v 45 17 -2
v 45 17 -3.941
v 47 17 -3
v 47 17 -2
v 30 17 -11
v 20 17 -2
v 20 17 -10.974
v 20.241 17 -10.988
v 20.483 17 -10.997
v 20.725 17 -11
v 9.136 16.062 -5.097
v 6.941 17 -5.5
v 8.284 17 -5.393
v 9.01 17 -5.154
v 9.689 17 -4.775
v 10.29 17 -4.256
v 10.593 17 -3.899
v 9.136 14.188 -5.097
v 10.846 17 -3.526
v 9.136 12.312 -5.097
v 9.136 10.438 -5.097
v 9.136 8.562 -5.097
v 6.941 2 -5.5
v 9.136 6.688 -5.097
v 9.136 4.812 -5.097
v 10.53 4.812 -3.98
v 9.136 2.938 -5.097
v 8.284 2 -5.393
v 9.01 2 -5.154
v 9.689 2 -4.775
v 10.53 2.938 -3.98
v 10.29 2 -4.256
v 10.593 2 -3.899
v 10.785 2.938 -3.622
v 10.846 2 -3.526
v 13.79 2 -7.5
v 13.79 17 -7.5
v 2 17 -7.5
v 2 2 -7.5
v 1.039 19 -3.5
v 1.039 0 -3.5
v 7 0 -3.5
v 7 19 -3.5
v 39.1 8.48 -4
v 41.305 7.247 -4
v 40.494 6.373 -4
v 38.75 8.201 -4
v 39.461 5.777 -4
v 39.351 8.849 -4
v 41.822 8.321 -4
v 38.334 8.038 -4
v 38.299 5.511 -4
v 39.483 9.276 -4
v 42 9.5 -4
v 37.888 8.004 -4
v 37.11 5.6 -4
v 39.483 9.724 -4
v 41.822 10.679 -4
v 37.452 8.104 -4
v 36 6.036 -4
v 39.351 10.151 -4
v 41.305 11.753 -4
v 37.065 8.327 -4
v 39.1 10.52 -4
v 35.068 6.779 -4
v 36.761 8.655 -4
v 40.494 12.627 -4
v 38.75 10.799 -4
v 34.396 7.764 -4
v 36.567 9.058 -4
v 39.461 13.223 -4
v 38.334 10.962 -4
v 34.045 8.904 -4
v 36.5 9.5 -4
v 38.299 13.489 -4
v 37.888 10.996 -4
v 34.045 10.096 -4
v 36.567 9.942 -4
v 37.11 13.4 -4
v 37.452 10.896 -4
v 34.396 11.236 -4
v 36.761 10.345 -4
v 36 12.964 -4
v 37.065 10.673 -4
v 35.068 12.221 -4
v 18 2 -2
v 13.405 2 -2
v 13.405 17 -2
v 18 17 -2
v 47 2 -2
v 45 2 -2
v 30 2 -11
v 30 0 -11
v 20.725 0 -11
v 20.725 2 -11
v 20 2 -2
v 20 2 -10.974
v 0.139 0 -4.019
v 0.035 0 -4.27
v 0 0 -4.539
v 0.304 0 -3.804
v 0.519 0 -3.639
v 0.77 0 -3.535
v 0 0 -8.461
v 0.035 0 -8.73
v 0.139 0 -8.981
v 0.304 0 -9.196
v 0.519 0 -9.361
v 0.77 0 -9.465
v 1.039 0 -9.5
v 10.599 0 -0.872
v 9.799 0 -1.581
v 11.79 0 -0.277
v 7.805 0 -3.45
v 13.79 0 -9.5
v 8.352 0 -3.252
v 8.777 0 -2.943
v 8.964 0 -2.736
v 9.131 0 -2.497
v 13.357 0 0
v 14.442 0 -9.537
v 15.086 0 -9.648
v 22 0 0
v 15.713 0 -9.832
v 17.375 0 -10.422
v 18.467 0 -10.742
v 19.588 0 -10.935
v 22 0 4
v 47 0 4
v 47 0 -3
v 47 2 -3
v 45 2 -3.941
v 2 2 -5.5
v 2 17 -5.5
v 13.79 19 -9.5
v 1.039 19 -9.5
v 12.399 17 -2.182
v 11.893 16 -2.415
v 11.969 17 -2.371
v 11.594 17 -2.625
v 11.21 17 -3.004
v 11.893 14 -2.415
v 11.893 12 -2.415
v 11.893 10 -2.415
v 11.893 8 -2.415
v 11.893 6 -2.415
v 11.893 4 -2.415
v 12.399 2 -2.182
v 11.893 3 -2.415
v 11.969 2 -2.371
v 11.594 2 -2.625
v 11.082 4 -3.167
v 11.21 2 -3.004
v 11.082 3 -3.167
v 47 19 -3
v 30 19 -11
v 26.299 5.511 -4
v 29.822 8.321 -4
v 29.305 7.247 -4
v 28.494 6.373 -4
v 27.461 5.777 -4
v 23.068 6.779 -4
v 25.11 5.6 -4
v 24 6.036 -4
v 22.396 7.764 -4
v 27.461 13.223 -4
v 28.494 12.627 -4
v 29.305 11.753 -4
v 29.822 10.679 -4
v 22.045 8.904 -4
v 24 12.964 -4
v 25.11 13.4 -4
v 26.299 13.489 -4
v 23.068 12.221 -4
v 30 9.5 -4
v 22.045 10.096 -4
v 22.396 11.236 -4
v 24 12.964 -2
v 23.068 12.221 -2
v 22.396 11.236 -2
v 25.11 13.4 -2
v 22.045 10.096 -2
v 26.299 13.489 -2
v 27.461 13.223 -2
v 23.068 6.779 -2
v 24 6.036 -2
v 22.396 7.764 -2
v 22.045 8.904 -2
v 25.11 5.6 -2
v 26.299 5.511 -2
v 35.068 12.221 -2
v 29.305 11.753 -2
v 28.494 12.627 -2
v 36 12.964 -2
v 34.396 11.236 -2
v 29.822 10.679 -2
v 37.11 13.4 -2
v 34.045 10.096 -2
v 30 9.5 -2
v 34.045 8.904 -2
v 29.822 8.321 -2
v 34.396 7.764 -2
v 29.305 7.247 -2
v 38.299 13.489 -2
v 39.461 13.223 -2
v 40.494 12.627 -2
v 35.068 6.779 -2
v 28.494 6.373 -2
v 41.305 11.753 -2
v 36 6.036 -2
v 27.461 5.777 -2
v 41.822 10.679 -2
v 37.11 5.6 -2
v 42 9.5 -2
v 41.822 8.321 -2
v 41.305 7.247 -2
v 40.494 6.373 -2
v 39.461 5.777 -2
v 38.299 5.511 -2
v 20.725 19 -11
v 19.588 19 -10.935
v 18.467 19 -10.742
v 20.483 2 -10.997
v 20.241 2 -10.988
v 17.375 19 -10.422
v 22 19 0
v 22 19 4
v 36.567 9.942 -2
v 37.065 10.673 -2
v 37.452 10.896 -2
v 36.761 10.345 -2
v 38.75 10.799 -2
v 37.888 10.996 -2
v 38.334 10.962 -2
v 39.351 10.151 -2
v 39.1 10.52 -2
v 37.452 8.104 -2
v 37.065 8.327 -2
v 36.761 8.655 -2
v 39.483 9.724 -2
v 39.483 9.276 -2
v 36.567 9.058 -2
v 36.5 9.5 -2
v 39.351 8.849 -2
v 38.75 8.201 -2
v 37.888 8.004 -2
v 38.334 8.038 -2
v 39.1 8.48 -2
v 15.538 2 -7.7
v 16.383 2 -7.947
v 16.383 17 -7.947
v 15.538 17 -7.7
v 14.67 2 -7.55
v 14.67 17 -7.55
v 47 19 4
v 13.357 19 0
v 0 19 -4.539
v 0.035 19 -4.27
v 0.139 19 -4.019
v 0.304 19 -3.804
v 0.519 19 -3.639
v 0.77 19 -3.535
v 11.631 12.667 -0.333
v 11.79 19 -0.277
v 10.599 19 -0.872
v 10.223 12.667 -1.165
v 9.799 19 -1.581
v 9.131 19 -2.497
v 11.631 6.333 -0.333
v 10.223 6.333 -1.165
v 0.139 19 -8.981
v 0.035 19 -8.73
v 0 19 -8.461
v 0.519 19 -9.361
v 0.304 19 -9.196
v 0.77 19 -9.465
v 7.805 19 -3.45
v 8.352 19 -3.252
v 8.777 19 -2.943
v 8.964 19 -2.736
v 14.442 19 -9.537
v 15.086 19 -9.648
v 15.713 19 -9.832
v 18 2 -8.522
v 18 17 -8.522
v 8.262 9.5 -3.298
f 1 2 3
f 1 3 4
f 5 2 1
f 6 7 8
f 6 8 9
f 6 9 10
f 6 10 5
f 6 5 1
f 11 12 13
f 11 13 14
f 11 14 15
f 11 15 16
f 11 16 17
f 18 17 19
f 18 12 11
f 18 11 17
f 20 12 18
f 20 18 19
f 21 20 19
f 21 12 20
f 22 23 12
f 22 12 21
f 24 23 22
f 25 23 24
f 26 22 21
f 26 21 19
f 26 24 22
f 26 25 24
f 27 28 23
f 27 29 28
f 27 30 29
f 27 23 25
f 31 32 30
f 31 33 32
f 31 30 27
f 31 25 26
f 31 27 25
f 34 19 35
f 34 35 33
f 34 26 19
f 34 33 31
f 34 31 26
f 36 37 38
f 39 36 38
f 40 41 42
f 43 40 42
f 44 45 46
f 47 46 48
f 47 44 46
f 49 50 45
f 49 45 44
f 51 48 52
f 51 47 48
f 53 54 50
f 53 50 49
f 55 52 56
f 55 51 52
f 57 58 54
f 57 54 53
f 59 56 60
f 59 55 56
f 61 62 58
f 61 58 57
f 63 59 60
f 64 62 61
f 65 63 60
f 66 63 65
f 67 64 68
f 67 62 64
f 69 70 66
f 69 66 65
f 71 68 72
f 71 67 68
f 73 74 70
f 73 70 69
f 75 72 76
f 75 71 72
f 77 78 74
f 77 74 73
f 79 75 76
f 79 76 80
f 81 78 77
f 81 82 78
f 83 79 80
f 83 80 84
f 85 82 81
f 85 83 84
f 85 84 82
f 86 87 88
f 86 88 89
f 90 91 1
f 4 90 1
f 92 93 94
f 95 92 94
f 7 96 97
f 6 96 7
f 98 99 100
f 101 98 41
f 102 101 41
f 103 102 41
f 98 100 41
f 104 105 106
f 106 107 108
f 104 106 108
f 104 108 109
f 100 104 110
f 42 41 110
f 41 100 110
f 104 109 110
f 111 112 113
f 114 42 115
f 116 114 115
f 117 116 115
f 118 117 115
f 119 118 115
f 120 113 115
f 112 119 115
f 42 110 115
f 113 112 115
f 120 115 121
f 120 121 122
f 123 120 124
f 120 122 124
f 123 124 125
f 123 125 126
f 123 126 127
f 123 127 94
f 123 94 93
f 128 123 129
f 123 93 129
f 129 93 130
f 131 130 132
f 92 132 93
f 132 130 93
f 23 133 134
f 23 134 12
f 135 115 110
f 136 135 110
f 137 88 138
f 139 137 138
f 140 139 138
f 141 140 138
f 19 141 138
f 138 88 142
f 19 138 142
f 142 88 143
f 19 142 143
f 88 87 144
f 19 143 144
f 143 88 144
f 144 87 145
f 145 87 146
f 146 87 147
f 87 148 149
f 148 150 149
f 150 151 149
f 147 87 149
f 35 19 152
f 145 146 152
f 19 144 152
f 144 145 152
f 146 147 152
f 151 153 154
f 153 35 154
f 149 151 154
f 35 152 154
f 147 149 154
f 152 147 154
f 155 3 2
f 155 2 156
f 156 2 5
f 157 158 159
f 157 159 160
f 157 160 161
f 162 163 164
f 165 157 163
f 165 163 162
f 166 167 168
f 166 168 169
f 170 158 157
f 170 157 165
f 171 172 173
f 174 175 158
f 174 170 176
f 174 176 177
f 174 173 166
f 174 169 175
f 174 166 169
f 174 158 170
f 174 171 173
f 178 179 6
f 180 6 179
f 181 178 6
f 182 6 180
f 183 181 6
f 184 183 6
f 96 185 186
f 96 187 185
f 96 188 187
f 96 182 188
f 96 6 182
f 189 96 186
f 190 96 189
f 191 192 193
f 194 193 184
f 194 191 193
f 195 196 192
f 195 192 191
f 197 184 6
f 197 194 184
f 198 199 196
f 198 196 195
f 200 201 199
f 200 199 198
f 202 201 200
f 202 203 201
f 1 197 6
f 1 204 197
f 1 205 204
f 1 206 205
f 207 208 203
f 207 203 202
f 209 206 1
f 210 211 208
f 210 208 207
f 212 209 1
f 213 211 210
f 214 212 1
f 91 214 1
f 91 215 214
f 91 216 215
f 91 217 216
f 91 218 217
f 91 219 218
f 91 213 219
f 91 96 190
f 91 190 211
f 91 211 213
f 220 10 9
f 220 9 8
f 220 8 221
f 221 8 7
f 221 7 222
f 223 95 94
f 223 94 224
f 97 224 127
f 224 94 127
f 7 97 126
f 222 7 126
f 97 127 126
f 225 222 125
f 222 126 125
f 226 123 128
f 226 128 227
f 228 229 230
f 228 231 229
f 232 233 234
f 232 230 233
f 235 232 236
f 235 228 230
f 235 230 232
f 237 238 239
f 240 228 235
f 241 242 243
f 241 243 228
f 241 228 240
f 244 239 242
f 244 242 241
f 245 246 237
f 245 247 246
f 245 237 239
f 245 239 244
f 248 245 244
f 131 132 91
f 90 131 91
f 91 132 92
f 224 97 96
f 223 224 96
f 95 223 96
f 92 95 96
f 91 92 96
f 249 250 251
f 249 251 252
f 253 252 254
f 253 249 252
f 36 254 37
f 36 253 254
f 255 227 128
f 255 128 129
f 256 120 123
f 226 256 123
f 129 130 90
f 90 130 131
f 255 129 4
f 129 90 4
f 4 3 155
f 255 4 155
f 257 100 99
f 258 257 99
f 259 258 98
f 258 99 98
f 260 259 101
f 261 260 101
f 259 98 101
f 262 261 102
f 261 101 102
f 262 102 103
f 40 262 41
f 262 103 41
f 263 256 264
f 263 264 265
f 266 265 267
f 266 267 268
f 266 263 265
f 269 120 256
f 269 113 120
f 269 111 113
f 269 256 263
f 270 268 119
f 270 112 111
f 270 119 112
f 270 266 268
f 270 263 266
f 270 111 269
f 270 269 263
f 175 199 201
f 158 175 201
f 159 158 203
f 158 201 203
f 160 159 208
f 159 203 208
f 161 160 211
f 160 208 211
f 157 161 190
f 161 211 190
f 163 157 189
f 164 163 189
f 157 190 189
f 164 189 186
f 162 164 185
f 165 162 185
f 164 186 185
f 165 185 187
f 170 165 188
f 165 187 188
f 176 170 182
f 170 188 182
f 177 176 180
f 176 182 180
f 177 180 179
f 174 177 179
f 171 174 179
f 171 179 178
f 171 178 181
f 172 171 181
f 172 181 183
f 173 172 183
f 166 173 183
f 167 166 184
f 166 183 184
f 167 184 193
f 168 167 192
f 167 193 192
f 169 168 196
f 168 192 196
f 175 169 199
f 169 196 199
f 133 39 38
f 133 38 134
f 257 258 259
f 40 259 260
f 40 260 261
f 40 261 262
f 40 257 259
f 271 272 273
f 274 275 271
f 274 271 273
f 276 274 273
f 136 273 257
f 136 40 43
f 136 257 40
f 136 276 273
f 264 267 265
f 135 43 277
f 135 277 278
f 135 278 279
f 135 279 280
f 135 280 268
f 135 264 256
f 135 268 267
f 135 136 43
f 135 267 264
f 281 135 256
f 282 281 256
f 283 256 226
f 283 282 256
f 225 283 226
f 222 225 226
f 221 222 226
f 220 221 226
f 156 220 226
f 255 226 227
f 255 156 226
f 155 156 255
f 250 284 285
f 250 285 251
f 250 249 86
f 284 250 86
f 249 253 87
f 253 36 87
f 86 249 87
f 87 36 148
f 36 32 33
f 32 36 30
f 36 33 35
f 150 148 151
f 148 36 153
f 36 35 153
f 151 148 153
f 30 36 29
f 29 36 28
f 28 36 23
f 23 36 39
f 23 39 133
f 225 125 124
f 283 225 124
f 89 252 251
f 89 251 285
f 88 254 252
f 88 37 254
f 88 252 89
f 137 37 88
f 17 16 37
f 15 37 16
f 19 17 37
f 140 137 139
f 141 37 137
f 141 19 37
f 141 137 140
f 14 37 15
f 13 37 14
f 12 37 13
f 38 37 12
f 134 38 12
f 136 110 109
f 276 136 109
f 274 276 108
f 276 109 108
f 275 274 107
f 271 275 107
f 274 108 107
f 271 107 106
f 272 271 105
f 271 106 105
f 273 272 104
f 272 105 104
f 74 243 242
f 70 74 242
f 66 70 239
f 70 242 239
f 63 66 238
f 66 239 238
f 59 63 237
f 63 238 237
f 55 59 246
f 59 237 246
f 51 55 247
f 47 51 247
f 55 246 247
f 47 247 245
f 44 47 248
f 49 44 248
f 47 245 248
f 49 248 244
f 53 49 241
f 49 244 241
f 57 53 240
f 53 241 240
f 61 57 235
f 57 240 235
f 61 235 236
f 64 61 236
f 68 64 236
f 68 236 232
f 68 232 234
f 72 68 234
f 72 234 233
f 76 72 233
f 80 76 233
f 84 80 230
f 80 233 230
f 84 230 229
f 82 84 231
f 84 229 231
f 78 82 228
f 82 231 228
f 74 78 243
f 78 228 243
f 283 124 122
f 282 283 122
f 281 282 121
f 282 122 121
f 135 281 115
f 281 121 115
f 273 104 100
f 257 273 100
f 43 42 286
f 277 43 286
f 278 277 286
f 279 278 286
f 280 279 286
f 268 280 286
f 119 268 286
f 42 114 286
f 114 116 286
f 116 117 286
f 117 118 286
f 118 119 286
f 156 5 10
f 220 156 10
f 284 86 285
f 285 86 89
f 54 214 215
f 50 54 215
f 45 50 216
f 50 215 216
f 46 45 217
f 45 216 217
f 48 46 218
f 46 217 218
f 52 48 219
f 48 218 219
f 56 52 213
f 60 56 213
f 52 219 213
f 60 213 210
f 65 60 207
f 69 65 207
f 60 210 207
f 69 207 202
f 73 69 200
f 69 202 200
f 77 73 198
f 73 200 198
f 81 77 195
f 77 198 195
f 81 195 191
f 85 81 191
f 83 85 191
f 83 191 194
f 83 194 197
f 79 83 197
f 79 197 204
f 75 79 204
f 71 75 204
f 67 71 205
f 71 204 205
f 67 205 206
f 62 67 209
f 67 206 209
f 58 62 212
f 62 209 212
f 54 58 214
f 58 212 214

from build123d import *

# Parameters (mm, degrees)
BOSS_EXTRUDE1_DEPTH = 19
SHELL1_START        = 2
SHELL1_DEPTH        = 15
SKETCH3_W           = 1.941176471
SKETCH3_H           = 15
CUT_EXTRUDE1_DEPTH  = 19
SKETCH4_W           = 27
SKETCH4_H           = 15
CUT_EXTRUDE2_DEPTH  = 32
BOSS_EXTRUDE2_REACH = 53.488
SKETCH5_W           = 2
SKETCH5_H           = 15
BOSS_EXTRUDE3_DEPTH = 2
SKETCH9_W           = 25
SKETCH9_H           = 19
BOSS_EXTRUDE4_DEPTH = 4


# Read off the part's stored shape, not the designer's step: Shell1
with BuildPart() as part:
    # Sketch1 → Boss-Extrude1 (new body)
    with BuildSketch(Plane(origin=(0, 0, 0), x_dir=(1, 0, 0), z_dir=(0, 1, 0))):
        with BuildLine():
            Line((1.038993018, 3.5), (7, 3.5))
            add(Edge.make_bspline(
                [(7, 3.5), (8.459278233, 3.59711175), (9.130651495, 2.496759959)],
                knots=[0, 0, 0, 1, 1, 1], degree=2))
            add(Edge.make_bspline(
                [(13.357309771, 0), (11.472981218, 0.082883183), (10.064095126, 0.915136502), (9.130651495, 2.496759959)],
                knots=[0.099588888, 0.099588888, 0.099588888, 0.099588888, 1, 1, 1, 1], degree=3))
            Line((13.357309771, 0), (47, 0))
            Line((47, 0), (47, 3))
            Line((47, 3), (30, 11))
            Line((30, 11), (20.724531658, 11))
            ThreePointArc((20.724531658, 11), (19.025085695, 10.854536185), (17.375081312, 10.422376684))
            Line((17.375081312, 10.422376684), (15.713240119, 9.83162822))
            ThreePointArc((15.713240119, 9.83162822), (14.765930685, 9.583514472), (13.790235586, 9.5))
            Line((13.790235586, 9.5), (1.038993018, 9.5))
            ThreePointArc((1.038993018, 9.5), (0.304314009, 9.195685991), (0, 8.461006982))
            Line((0, 8.461006982), (0, 4.538993018))
            ThreePointArc((0, 4.538993018), (0.304314009, 3.804314009), (1.038993018, 3.5))
        make_face()
    extrude(amount=BOSS_EXTRUDE1_DEPTH)

    # Shell1 outline → Shell1 (cut)
    with BuildSketch(Plane(origin=(0, 0, 0), x_dir=(1, 0, 0), z_dir=(0, 1, 0)).offset(SHELL1_START)):
        with BuildLine():
            Line((2, 5.5), (6.940673062, 5.500000119))
            add(Edge.make_bspline(
                [(6.940673062, 5.500000119), (7.109177951, 5.50902653), (7.278234995, 5.512602664), (7.447878181, 5.510422658), (7.618098093, 5.502157784), (7.78882908, 5.487449259), (7.959932498, 5.465914346), (8.131179576, 5.437162857), (8.302237446, 5.400821142), (8.47266191, 5.356560666), (8.641900457, 5.304128263), (8.809309112, 5.243375169), (8.974186651, 5.174281921), (9.219363913, 5.057026039), (9.302034833, 5.014883346), (9.383743481, 4.970562513), (9.464391034, 4.924089732), (9.543880108, 4.875502014), (9.622116004, 4.824846185), (9.699007976, 4.772177888), (9.774470476, 4.71756058), (9.848424417, 4.661064529), (9.920798428, 4.602765816), (9.991530106, 4.542745331), (10.060567276, 4.481087773), (10.161520229, 4.386277087), (10.194737041, 4.354285549), (10.227514411, 4.321917126), (10.25984764, 4.289182819), (10.291732596, 4.256093529), (10.323165718, 4.222660069), (10.354144009, 4.188893152), (10.384665044, 4.154803401), (10.414726966, 4.120401341), (10.444328485, 4.085697407), (10.47346888, 4.050701936), (10.502148, 4.015425173), (10.544475391, 3.962103314), (10.558469269, 3.944261494), (10.572347936, 3.926353044), (10.586111461, 3.908379178), (10.599759937, 3.890341094), (10.613293488, 3.872239973), (10.626712261, 3.854076975), (10.640016431, 3.835853244), (10.6532062, 3.817569903), (10.666281796, 3.799228059), (10.679243473, 3.7808288), (10.692091515, 3.762373195), (10.711193584, 3.734606845), (10.717532595, 3.725337582), (10.723843304, 3.716054631), (10.730125756, 3.706758115), (10.736379994, 3.697448159), (10.742606064, 3.688124887), (10.748804009, 3.678788423), (10.754973874, 3.669438891), (10.761115703, 3.660076416), (10.76722954, 3.650701121), (10.77331543, 3.641313131), (10.779373416, 3.63191257), (10.788418607, 3.617793057), (10.791426708, 3.613083439), (10.794427853, 3.608370721), (10.797422049, 3.603654918), (10.800409303, 3.598936043), (10.803389621, 3.594214111), (10.806363009, 3.589489136), (10.809329475, 3.584761133), (10.812289025, 3.580030115), (10.815241666, 3.575296097), (10.818187405, 3.570559093), (10.821126247, 3.565819118), (10.824791189, 3.559890452), (10.825523747, 3.558704534), (10.826255874, 3.557518432), (10.826987571, 3.556332144), (10.827718838, 3.555145673), (10.828449675, 3.553959018), (10.829180081, 3.552772178), (10.829910058, 3.551585155), (10.830639605, 3.550397949), (10.831368723, 3.54921056), (10.83209741, 3.548022987), (10.832825669, 3.546835232), (10.833735455, 3.54535031), (10.833917386, 3.545053315), (10.834099289, 3.544756307), (10.834281166, 3.544459289), (10.834463016, 3.544162259), (10.834644839, 3.543865217), (10.834826636, 3.543568164), (10.835008405, 3.5432711), (10.835190148, 3.542974025), (10.835371864, 3.542676938), (10.835553553, 3.542379839), (10.835735215, 3.54208273), (10.836007668, 3.541637048), (10.836098479, 3.541488485), (10.836189283, 3.541339918), (10.836280081, 3.541191349), (10.836370872, 3.541042777), (10.836461656, 3.540894203), (10.836552434, 3.540745625), (10.836643204, 3.540597045), (10.836733968, 3.540448461), (10.836824726, 3.540299875), (10.836915476, 3.540151286), (10.83700622, 3.540002694), (10.837142326, 3.539779803), (10.837187693, 3.539705504), (10.837233059, 3.539631206), (10.837278422, 3.539556906), (10.837323784, 3.539482606), (10.837369144, 3.539408305), (10.837414503, 3.539334004), (10.83745986, 3.539259701), (10.837505215, 3.539185398), (10.837550569, 3.539111095), (10.83759592, 3.53903679), (10.837641271, 3.538962485), (10.837697956, 3.538869603), (10.837709293, 3.538851026), (10.83772063, 3.53883245), (10.837731967, 3.538813873), (10.837743304, 3.538795297), (10.83775464, 3.53877672), (10.837765977, 3.538758143), (10.837777313, 3.538739566), (10.83778865, 3.53872099), (10.837799986, 3.538702413), (10.837811322, 3.538683836), (10.837822658, 3.538665259), (10.837839662, 3.538637393), (10.83784533, 3.538628105), (10.837850998, 3.538618816), (10.837856665, 3.538609528), (10.837862333, 3.538600239), (10.837868001, 3.538590951), (10.837873669, 3.538581662), (10.837879336, 3.538572374), (10.837885004, 3.538563085), (10.837890672, 3.538553797), (10.83789634, 3.538544508), (10.837902007, 3.538535219), (10.837913343, 3.538516642), (10.837916038, 3.538512225), (10.837946561, 3.538462199), (10.83784979, 3.538620803), (10.838122406, 3.538173997), (10.837653087, 3.53894319), (10.838244889, 3.537973253), (10.837760219, 3.538767605), (10.838033901, 3.538319054), (10.837937534, 3.538476994), (10.837963449, 3.53843452), (10.837964102, 3.538433451), (10.83798002, 3.538407361), (10.837992755, 3.53838649), (10.838005489, 3.538365619), (10.838018224, 3.538344747), (10.838030958, 3.538323876), (10.838043693, 3.538303005), (10.838056427, 3.538282134), (10.838069162, 3.538261262), (10.838081896, 3.538240391), (10.838094631, 3.53821952), (10.838107365, 3.538198648), (10.8381201, 3.538177777), (10.838336586, 3.537822965), (10.838540338, 3.537489024), (10.838744091, 3.537155083), (10.838947843, 3.536821142), (10.839151595, 3.536487201), (10.839355347, 3.53615326), (10.839559099, 3.535819319), (10.839762851, 3.535485379), (10.839966603, 3.535151438), (10.840170355, 3.534817497), (10.840374107, 3.534483556), (10.840577859, 3.534149615), (10.841151786, 3.533208975), (10.84152196, 3.532602276), (10.841892134, 3.531995576), (10.842262308, 3.531388877), (10.842632482, 3.530782178), (10.843002656, 3.530175479), (10.84337283, 3.529568779), (10.843743004, 3.52896208), (10.844113178, 3.528355381), (10.844483352, 3.527748682), (10.844853526, 3.527141983), (10.8452237, 3.526535283), (10.845593874, 3.525928584)],
                knots=[0.016399164, 0.016399164, 0.016399164, 0.016399164, 0.016399164, 0.016399164, 0.016399164, 0.016399164, 0.016399164, 0.016399164, 0.016399164, 0.016399164, 0.016399164, 0.016399164, 0.505, 0.505, 0.505, 0.505, 0.505, 0.505, 0.505, 0.505, 0.505, 0.505, 0.505, 0.505, 0.7575, 0.7575, 0.7575, 0.7575, 0.7575, 0.7575, 0.7575, 0.7575, 0.7575, 0.7575, 0.7575, 0.7575, 0.88375, 0.88375, 0.88375, 0.88375, 0.88375, 0.88375, 0.88375, 0.88375, 0.88375, 0.88375, 0.88375, 0.88375, 0.946875, 0.946875, 0.946875, 0.946875, 0.946875, 0.946875, 0.946875, 0.946875, 0.946875, 0.946875, 0.946875, 0.946875, 0.9784375, 0.9784375, 0.9784375, 0.9784375, 0.9784375, 0.9784375, 0.9784375, 0.9784375, 0.9784375, 0.9784375, 0.9784375, 0.9784375, 0.99421875, 0.99421875, 0.99421875, 0.99421875, 0.99421875, 0.99421875, 0.99421875, 0.99421875, 0.99421875, 0.99421875, 0.99421875, 0.99421875, 0.998164063, 0.998164063, 0.998164063, 0.998164063, 0.998164063, 0.998164063, 0.998164063, 0.998164063, 0.998164063, 0.998164063, 0.998164063, 0.998164063, 0.999150391, 0.999150391, 0.999150391, 0.999150391, 0.999150391, 0.999150391, 0.999150391, 0.999150391, 0.999150391, 0.999150391, 0.999150391, 0.999150391, 0.999643555, 0.999643555, 0.999643555, 0.999643555, 0.999643555, 0.999643555, 0.999643555, 0.999643555, 0.999643555, 0.999643555, 0.999643555, 0.999643555, 0.999890137, 0.999890137, 0.999890137, 0.999890137, 0.999890137, 0.999890137, 0.999890137, 0.999890137, 0.999890137, 0.999890137, 0.999890137, 0.999890137, 0.999951782, 0.999951782, 0.999951782, 0.999951782, 0.999951782, 0.999951782, 0.999951782, 0.999951782, 0.999951782, 0.999951782, 0.999951782, 0.999951782, 0.999982605, 0.999982605, 0.999982605, 0.999982605, 0.999982605, 0.999982605, 0.999982605, 0.999982605, 0.999982605, 0.999982605, 0.999982605, 0.999982605, 1.000013428, 1.000013428, 1.000013428, 1.000013428, 1.000013428, 1.000013428, 1.000013428, 1.000013428, 1.000013428, 1.000013428, 1.000013428, 1.000013428, 1.000136719, 1.000136719, 1.000136719, 1.000136719, 1.000136719, 1.000136719, 1.000136719, 1.000136719, 1.000136719, 1.000136719, 1.000136719, 1.000136719, 1.002109375, 1.002109375, 1.002109375, 1.002109375, 1.002109375, 1.002109375, 1.002109375, 1.002109375, 1.002109375, 1.002109375, 1.002109375, 1.002109375, 1.00569327, 1.00569327, 1.00569327, 1.00569327, 1.00569327, 1.00569327, 1.00569327, 1.00569327, 1.00569327, 1.00569327, 1.00569327, 1.00569327, 1.00569327, 1.00569327], degree=13))
            add(Edge.make_bspline(
                [(13.40502786, 2.000000011), (13.264344282, 2.007348761), (13.129461459, 2.018818573), (13.000298688, 2.034202634), (12.876741801, 2.053292288), (12.758634127, 2.075880248), (12.645770972, 2.101768123), (12.53789756, 2.130776865), (12.43471047, 2.162758716), (12.335862518, 2.197609267), (12.24097111, 2.235278213), (12.149630028, 2.2757774), (12.061424662, 2.319184765), (11.975950656, 2.365642759), (11.85043569, 2.440707527), (11.808649689, 2.466910979), (11.767427174, 2.493986159), (11.726719836, 2.521963241), (11.68648208, 2.550876142), (11.64667126, 2.580762055), (11.607247906, 2.611660969), (11.568175964, 2.643615195), (11.529423015, 2.676668893), (11.490960519, 2.710867597), (11.452764036, 2.746257739), (11.414813464, 2.782886175), (11.377093268, 2.820799712), (11.320842431, 2.879667092), (11.302146827, 2.899622258), (11.283504508, 2.919916022), (11.264914303, 2.940554181), (11.246375261, 2.961542442), (11.227886646, 2.982886421), (11.209447946, 3.004591639), (11.191058864, 3.026663528), (11.172719324, 3.049107427), (11.154429467, 3.071928583), (11.136189656, 3.095132152), (11.118000471, 3.118723197), (11.099862709, 3.14270669), (11.072734729, 3.179277921), (11.063705051, 3.191567735), (11.054688524, 3.203957503), (11.045685321, 3.216447775), (11.036695613, 3.2290391), (11.02771957, 3.241732028), (11.018757363, 3.25452711), (11.009809165, 3.267424893), (11.000875145, 3.280425929), (10.991955475, 3.293530767), (10.983050326, 3.306739957), (10.974159869, 3.320054049), (10.965284275, 3.333473592), (10.951993435, 3.353761908), (10.947566934, 3.360551162), (10.943144241, 3.367366957), (10.938725387, 3.374209352), (10.934310402, 3.381078406), (10.929899315, 3.387974178), (10.925492157, 3.394896728), (10.921088956, 3.401846114), (10.916689746, 3.408822396), (10.912294553, 3.415825632), (10.907903408, 3.422855882), (10.903516342, 3.429913206), (10.899133385, 3.436997661), (10.892565157, 3.44766513), (10.890376783, 3.45122775), (10.888189448, 3.454797173), (10.886003158, 3.458373406), (10.883817916, 3.461956456), (10.881633726, 3.46554633), (10.879450592, 3.469143034), (10.877268519, 3.472746575), (10.875087511, 3.47635696), (10.872907571, 3.479974196), (10.870728705, 3.483598289), (10.868550916, 3.487229246), (10.866374209, 3.490867075), (10.863654681, 3.495422958), (10.863110843, 3.496334564), (10.862567074, 3.4972466), (10.862023372, 3.498159067), (10.861479738, 3.499071963), (10.860936173, 3.49998529), (10.860392676, 3.500899047), (10.859849247, 3.501813235), (10.859305886, 3.502727853), (10.858762594, 3.503642901), (10.85821937, 3.504558381), (10.857676215, 3.505474291), (10.857133128, 3.506390633), (10.856454356, 3.507536598), (10.856318605, 3.507765818), (10.856182859, 3.507995065), (10.856047118, 3.508224339), (10.85591138, 3.50845364), (10.855775648, 3.508682968), (10.855639918, 3.508912322), (10.855504195, 3.509141704), (10.855368474, 3.509371113), (10.855232759, 3.509600548), (10.855097047, 3.509830011), (10.85496134, 3.510059501), (10.854825637, 3.510289017), (10.854622089, 3.510633332), (10.854554241, 3.510748111), (10.854486393, 3.510862896), (10.854418547, 3.510977688), (10.854350702, 3.511092487), (10.854282858, 3.511207292), (10.854215016, 3.511322104), (10.854147174, 3.511436923), (10.854079333, 3.511551749), (10.854011494, 3.511666581), (10.853943655, 3.51178142), (10.853875818, 3.511896266), (10.853807981, 3.512011119), (10.853706228, 3.512183408), (10.853672311, 3.512240839), (10.853638394, 3.512298272), (10.853604477, 3.512355707), (10.85357056, 3.512413143), (10.853536644, 3.512470581), (10.853502728, 3.512528021), (10.853468812, 3.512585463), (10.853434897, 3.512642906), (10.853400982, 3.512700351), (10.853367066, 3.512757797), (10.853333152, 3.512815245), (10.853299237, 3.512872695), (10.853256845, 3.51294451), (10.853248366, 3.512958873), (10.853239888, 3.512973236), (10.853231409, 3.512987599), (10.853222931, 3.513001962), (10.853214452, 3.513016326), (10.853205974, 3.513030689), (10.853197496, 3.513045053), (10.853189017, 3.513059417), (10.853180539, 3.513073781), (10.85317206, 3.513088145), (10.853163582, 3.513102509), (10.853155104, 3.513116873), (10.853138147, 3.513145601), (10.85312929, 3.513160607), (10.853122642, 3.51317187), (10.853113824, 3.513186812), (10.853080604, 3.513243094), (10.853183622, 3.513068551), (10.852898834, 3.513551077), (10.85334732, 3.512791183), (10.852811074, 3.513699781), (10.853221217, 3.513004843), (10.853004235, 3.513372494), (10.853047842, 3.513298607), (10.853028513, 3.513331359), (10.852991521, 3.513394037), (10.85296686, 3.513435823), (10.852942199, 3.513477609), (10.852917538, 3.513519394), (10.852892877, 3.51356118), (10.852868216, 3.513602966), (10.852843554, 3.513644752), (10.852818894, 3.513686537), (10.852794232, 3.513728323), (10.852769571, 3.513770109), (10.85274491, 3.513811894), (10.852720249, 3.51385368), (10.852695588, 3.513895466), (10.852276349, 3.514605823), (10.851881771, 3.515274394), (10.851487193, 3.515942965), (10.851092615, 3.516611537), (10.850698037, 3.517280108), (10.85030346, 3.517948679), (10.849908881, 3.518617251), (10.849514304, 3.519285822), (10.849119726, 3.519954393), (10.848725148, 3.520622965), (10.84833057, 3.521291536), (10.847935992, 3.521960107), (10.847541414, 3.522628678), (10.847035911, 3.523485202), (10.846924985, 3.523673155), (10.846814059, 3.523861107), (10.846703133, 3.52404906), (10.846592207, 3.524237012), (10.846481281, 3.524424964), (10.846370355, 3.524612917), (10.846259429, 3.524800869), (10.846148503, 3.524988822), (10.846037577, 3.525176774), (10.845926651, 3.525364727), (10.845815726, 3.525552679), (10.8457048, 3.525740632), (10.845593874, 3.525928584)],
                knots=[0.108628768, 0.108628768, 0.108628768, 0.108628768, 0.108628768, 0.108628768, 0.108628768, 0.108628768, 0.108628768, 0.108628768, 0.108628768, 0.108628768, 0.108628768, 0.108628768, 0.108628768, 0.5542965, 0.5542965, 0.5542965, 0.5542965, 0.5542965, 0.5542965, 0.5542965, 0.5542965, 0.5542965, 0.5542965, 0.5542965, 0.5542965, 0.5542965, 0.781650305, 0.781650305, 0.781650305, 0.781650305, 0.781650305, 0.781650305, 0.781650305, 0.781650305, 0.781650305, 0.781650305, 0.781650305, 0.781650305, 0.781650305, 0.895327208, 0.895327208, 0.895327208, 0.895327208, 0.895327208, 0.895327208, 0.895327208, 0.895327208, 0.895327208, 0.895327208, 0.895327208, 0.895327208, 0.895327208, 0.95216566, 0.95216566, 0.95216566, 0.95216566, 0.95216566, 0.95216566, 0.95216566, 0.95216566, 0.95216566, 0.95216566, 0.95216566, 0.95216566, 0.95216566, 0.980584885, 0.980584885, 0.980584885, 0.980584885, 0.980584885, 0.980584885, 0.980584885, 0.980584885, 0.980584885, 0.980584885, 0.980584885, 0.980584885, 0.980584885, 0.994794498, 0.994794498, 0.994794498, 0.994794498, 0.994794498, 0.994794498, 0.994794498, 0.994794498, 0.994794498, 0.994794498, 0.994794498, 0.994794498, 0.994794498, 0.998346901, 0.998346901, 0.998346901, 0.998346901, 0.998346901, 0.998346901, 0.998346901, 0.998346901, 0.998346901, 0.998346901, 0.998346901, 0.998346901, 0.998346901, 0.999235002, 0.999235002, 0.999235002, 0.999235002, 0.999235002, 0.999235002, 0.999235002, 0.999235002, 0.999235002, 0.999235002, 0.999235002, 0.999235002, 0.999235002, 0.999679053, 0.999679053, 0.999679053, 0.999679053, 0.999679053, 0.999679053, 0.999679053, 0.999679053, 0.999679053, 0.999679053, 0.999679053, 0.999679053, 0.999679053, 0.999901078, 0.999901078, 0.999901078, 0.999901078, 0.999901078, 0.999901078, 0.999901078, 0.999901078, 0.999901078, 0.999901078, 0.999901078, 0.999901078, 0.999901078, 0.999956584, 0.999956584, 0.999956584, 0.999956584, 0.999956584, 0.999956584, 0.999956584, 0.999956584, 0.999956584, 0.999956584, 0.999956584, 0.999956584, 0.999956584, 1.00001209, 1.00001209, 1.00001209, 1.00001209, 1.00001209, 1.00001209, 1.00001209, 1.00001209, 1.00001209, 1.00001209, 1.00001209, 1.00001209, 1.00001209, 1.000123103, 1.000123103, 1.000123103, 1.000123103, 1.000123103, 1.000123103, 1.000123103, 1.000123103, 1.000123103, 1.000123103, 1.000123103, 1.000123103, 1.000123103, 1.001899305, 1.001899305, 1.001899305, 1.001899305, 1.001899305, 1.001899305, 1.001899305, 1.001899305, 1.001899305, 1.001899305, 1.001899305, 1.001899305, 1.001899305, 1.00239864, 1.00239864, 1.00239864, 1.00239864, 1.00239864, 1.00239864, 1.00239864, 1.00239864, 1.00239864, 1.00239864, 1.00239864, 1.00239864, 1.00239864, 1.00239864, 1.00239864], degree=14))
            Line((13.40502786, 2.000000011), (45, 2))
            Line((45, 2), (45, 3.941176471))
            Line((45, 3.941176471), (30, 11))
            Line((30, 11), (20.724531658, 11))
            Line((20.724531658, 11), (20.724531658, 9))
            ThreePointArc((20.724531658, 9), (19.364974888, 8.883628948), (18.044971381, 8.537901347))
            Line((18.044971381, 8.537901347), (16.383130188, 7.947152883))
            ThreePointArc((16.383130188, 7.947152883), (15.105819878, 7.612607235), (13.790235586, 7.5))
            Line((13.790235586, 7.5), (2, 7.5))
            Line((2, 7.5), (2, 5.5))
        make_face()
    extrude(amount=SHELL1_DEPTH, mode=Mode.SUBTRACT)

    # Sketch3 → Cut-Extrude1 (cut)
    with BuildSketch(Plane.ZY.offset(-45)):
        with Locations((-2.970588236, 9.5)):
            Rectangle(SKETCH3_W, SKETCH3_H)
    extrude(amount=-CUT_EXTRUDE1_DEPTH, mode=Mode.SUBTRACT)

    # Sketch4 → Cut-Extrude2 (cut)
    with BuildSketch(Plane(origin=(0, 0, -2), x_dir=(-1, 0, 0), z_dir=(0, 0, -1))):
        with Locations((-33.5, 9.5)):
            Rectangle(SKETCH4_W, SKETCH4_H)
    extrude(amount=CUT_EXTRUDE2_DEPTH, mode=Mode.SUBTRACT)

    # Boss-Extrude2: up to this plane
    boss_extrude2_end = Plane(origin=(-0.670110696, 19, -1.885095984), z_dir=(-0.33494503463592523, 0, -0.9422376684110751))
    # Sketch5 → Boss-Extrude2 (add, up to the surface)
    with BuildSketch(Plane(origin=(0, 0, -2), x_dir=(-1, 0, 0), z_dir=(0, 0, -1)), mode=Mode.PRIVATE) as boss_extrude2_sk1:
        with Locations((-19, 9.5)):
            Rectangle(SKETCH5_W, SKETCH5_H)
    boss_extrude2_tool1 = split(extrude(boss_extrude2_sk1.sketch, amount=BOSS_EXTRUDE2_REACH, mode=Mode.PRIVATE), bisect_by=boss_extrude2_end, keep=Keep.BOTH, mode=Mode.PRIVATE)
    add(boss_extrude2_tool1.solids().sort_by_distance((19, 9.5, -2))[0])

    # Sketch8 → Boss-Extrude3 (add)
    with BuildSketch(Plane(origin=(0, 0, -2), x_dir=(-1, 0, 0), z_dir=(0, 0, -1))):
        with BuildLine():
            ThreePointArc((-34, 9.5), (-38, 13.5), (-42, 9.5))
            Line((-42, 9.5), (-39.5, 9.5))
            ThreePointArc((-39.5, 9.5), (-38, 11), (-36.5, 9.5))
            Line((-36.5, 9.5), (-34, 9.5))
        make_face()
        with BuildLine():
            Line((-39.5, 9.5), (-42, 9.5))
            ThreePointArc((-42, 9.5), (-38, 5.5), (-34, 9.5))
            Line((-34, 9.5), (-36.5, 9.5))
            ThreePointArc((-36.5, 9.5), (-38, 8), (-39.5, 9.5))
        make_face()
        with BuildLine():
            ThreePointArc((-22, 9.5), (-26, 13.5), (-30, 9.5))
            Line((-30, 9.5), (-22, 9.5))
        make_face()
        with BuildLine():
            Line((-22, 9.5), (-30, 9.5))
            ThreePointArc((-30, 9.5), (-26, 5.5), (-22, 9.5))
        make_face()
    extrude(amount=BOSS_EXTRUDE3_DEPTH)

    # Sketch9 → Boss-Extrude4 (add)
    with BuildSketch(Plane.XY):
        with Locations((34.5, 9.5)):
            Rectangle(SKETCH9_W, SKETCH9_H)
    extrude(amount=BOSS_EXTRUDE4_DEPTH)


solid = part.part
